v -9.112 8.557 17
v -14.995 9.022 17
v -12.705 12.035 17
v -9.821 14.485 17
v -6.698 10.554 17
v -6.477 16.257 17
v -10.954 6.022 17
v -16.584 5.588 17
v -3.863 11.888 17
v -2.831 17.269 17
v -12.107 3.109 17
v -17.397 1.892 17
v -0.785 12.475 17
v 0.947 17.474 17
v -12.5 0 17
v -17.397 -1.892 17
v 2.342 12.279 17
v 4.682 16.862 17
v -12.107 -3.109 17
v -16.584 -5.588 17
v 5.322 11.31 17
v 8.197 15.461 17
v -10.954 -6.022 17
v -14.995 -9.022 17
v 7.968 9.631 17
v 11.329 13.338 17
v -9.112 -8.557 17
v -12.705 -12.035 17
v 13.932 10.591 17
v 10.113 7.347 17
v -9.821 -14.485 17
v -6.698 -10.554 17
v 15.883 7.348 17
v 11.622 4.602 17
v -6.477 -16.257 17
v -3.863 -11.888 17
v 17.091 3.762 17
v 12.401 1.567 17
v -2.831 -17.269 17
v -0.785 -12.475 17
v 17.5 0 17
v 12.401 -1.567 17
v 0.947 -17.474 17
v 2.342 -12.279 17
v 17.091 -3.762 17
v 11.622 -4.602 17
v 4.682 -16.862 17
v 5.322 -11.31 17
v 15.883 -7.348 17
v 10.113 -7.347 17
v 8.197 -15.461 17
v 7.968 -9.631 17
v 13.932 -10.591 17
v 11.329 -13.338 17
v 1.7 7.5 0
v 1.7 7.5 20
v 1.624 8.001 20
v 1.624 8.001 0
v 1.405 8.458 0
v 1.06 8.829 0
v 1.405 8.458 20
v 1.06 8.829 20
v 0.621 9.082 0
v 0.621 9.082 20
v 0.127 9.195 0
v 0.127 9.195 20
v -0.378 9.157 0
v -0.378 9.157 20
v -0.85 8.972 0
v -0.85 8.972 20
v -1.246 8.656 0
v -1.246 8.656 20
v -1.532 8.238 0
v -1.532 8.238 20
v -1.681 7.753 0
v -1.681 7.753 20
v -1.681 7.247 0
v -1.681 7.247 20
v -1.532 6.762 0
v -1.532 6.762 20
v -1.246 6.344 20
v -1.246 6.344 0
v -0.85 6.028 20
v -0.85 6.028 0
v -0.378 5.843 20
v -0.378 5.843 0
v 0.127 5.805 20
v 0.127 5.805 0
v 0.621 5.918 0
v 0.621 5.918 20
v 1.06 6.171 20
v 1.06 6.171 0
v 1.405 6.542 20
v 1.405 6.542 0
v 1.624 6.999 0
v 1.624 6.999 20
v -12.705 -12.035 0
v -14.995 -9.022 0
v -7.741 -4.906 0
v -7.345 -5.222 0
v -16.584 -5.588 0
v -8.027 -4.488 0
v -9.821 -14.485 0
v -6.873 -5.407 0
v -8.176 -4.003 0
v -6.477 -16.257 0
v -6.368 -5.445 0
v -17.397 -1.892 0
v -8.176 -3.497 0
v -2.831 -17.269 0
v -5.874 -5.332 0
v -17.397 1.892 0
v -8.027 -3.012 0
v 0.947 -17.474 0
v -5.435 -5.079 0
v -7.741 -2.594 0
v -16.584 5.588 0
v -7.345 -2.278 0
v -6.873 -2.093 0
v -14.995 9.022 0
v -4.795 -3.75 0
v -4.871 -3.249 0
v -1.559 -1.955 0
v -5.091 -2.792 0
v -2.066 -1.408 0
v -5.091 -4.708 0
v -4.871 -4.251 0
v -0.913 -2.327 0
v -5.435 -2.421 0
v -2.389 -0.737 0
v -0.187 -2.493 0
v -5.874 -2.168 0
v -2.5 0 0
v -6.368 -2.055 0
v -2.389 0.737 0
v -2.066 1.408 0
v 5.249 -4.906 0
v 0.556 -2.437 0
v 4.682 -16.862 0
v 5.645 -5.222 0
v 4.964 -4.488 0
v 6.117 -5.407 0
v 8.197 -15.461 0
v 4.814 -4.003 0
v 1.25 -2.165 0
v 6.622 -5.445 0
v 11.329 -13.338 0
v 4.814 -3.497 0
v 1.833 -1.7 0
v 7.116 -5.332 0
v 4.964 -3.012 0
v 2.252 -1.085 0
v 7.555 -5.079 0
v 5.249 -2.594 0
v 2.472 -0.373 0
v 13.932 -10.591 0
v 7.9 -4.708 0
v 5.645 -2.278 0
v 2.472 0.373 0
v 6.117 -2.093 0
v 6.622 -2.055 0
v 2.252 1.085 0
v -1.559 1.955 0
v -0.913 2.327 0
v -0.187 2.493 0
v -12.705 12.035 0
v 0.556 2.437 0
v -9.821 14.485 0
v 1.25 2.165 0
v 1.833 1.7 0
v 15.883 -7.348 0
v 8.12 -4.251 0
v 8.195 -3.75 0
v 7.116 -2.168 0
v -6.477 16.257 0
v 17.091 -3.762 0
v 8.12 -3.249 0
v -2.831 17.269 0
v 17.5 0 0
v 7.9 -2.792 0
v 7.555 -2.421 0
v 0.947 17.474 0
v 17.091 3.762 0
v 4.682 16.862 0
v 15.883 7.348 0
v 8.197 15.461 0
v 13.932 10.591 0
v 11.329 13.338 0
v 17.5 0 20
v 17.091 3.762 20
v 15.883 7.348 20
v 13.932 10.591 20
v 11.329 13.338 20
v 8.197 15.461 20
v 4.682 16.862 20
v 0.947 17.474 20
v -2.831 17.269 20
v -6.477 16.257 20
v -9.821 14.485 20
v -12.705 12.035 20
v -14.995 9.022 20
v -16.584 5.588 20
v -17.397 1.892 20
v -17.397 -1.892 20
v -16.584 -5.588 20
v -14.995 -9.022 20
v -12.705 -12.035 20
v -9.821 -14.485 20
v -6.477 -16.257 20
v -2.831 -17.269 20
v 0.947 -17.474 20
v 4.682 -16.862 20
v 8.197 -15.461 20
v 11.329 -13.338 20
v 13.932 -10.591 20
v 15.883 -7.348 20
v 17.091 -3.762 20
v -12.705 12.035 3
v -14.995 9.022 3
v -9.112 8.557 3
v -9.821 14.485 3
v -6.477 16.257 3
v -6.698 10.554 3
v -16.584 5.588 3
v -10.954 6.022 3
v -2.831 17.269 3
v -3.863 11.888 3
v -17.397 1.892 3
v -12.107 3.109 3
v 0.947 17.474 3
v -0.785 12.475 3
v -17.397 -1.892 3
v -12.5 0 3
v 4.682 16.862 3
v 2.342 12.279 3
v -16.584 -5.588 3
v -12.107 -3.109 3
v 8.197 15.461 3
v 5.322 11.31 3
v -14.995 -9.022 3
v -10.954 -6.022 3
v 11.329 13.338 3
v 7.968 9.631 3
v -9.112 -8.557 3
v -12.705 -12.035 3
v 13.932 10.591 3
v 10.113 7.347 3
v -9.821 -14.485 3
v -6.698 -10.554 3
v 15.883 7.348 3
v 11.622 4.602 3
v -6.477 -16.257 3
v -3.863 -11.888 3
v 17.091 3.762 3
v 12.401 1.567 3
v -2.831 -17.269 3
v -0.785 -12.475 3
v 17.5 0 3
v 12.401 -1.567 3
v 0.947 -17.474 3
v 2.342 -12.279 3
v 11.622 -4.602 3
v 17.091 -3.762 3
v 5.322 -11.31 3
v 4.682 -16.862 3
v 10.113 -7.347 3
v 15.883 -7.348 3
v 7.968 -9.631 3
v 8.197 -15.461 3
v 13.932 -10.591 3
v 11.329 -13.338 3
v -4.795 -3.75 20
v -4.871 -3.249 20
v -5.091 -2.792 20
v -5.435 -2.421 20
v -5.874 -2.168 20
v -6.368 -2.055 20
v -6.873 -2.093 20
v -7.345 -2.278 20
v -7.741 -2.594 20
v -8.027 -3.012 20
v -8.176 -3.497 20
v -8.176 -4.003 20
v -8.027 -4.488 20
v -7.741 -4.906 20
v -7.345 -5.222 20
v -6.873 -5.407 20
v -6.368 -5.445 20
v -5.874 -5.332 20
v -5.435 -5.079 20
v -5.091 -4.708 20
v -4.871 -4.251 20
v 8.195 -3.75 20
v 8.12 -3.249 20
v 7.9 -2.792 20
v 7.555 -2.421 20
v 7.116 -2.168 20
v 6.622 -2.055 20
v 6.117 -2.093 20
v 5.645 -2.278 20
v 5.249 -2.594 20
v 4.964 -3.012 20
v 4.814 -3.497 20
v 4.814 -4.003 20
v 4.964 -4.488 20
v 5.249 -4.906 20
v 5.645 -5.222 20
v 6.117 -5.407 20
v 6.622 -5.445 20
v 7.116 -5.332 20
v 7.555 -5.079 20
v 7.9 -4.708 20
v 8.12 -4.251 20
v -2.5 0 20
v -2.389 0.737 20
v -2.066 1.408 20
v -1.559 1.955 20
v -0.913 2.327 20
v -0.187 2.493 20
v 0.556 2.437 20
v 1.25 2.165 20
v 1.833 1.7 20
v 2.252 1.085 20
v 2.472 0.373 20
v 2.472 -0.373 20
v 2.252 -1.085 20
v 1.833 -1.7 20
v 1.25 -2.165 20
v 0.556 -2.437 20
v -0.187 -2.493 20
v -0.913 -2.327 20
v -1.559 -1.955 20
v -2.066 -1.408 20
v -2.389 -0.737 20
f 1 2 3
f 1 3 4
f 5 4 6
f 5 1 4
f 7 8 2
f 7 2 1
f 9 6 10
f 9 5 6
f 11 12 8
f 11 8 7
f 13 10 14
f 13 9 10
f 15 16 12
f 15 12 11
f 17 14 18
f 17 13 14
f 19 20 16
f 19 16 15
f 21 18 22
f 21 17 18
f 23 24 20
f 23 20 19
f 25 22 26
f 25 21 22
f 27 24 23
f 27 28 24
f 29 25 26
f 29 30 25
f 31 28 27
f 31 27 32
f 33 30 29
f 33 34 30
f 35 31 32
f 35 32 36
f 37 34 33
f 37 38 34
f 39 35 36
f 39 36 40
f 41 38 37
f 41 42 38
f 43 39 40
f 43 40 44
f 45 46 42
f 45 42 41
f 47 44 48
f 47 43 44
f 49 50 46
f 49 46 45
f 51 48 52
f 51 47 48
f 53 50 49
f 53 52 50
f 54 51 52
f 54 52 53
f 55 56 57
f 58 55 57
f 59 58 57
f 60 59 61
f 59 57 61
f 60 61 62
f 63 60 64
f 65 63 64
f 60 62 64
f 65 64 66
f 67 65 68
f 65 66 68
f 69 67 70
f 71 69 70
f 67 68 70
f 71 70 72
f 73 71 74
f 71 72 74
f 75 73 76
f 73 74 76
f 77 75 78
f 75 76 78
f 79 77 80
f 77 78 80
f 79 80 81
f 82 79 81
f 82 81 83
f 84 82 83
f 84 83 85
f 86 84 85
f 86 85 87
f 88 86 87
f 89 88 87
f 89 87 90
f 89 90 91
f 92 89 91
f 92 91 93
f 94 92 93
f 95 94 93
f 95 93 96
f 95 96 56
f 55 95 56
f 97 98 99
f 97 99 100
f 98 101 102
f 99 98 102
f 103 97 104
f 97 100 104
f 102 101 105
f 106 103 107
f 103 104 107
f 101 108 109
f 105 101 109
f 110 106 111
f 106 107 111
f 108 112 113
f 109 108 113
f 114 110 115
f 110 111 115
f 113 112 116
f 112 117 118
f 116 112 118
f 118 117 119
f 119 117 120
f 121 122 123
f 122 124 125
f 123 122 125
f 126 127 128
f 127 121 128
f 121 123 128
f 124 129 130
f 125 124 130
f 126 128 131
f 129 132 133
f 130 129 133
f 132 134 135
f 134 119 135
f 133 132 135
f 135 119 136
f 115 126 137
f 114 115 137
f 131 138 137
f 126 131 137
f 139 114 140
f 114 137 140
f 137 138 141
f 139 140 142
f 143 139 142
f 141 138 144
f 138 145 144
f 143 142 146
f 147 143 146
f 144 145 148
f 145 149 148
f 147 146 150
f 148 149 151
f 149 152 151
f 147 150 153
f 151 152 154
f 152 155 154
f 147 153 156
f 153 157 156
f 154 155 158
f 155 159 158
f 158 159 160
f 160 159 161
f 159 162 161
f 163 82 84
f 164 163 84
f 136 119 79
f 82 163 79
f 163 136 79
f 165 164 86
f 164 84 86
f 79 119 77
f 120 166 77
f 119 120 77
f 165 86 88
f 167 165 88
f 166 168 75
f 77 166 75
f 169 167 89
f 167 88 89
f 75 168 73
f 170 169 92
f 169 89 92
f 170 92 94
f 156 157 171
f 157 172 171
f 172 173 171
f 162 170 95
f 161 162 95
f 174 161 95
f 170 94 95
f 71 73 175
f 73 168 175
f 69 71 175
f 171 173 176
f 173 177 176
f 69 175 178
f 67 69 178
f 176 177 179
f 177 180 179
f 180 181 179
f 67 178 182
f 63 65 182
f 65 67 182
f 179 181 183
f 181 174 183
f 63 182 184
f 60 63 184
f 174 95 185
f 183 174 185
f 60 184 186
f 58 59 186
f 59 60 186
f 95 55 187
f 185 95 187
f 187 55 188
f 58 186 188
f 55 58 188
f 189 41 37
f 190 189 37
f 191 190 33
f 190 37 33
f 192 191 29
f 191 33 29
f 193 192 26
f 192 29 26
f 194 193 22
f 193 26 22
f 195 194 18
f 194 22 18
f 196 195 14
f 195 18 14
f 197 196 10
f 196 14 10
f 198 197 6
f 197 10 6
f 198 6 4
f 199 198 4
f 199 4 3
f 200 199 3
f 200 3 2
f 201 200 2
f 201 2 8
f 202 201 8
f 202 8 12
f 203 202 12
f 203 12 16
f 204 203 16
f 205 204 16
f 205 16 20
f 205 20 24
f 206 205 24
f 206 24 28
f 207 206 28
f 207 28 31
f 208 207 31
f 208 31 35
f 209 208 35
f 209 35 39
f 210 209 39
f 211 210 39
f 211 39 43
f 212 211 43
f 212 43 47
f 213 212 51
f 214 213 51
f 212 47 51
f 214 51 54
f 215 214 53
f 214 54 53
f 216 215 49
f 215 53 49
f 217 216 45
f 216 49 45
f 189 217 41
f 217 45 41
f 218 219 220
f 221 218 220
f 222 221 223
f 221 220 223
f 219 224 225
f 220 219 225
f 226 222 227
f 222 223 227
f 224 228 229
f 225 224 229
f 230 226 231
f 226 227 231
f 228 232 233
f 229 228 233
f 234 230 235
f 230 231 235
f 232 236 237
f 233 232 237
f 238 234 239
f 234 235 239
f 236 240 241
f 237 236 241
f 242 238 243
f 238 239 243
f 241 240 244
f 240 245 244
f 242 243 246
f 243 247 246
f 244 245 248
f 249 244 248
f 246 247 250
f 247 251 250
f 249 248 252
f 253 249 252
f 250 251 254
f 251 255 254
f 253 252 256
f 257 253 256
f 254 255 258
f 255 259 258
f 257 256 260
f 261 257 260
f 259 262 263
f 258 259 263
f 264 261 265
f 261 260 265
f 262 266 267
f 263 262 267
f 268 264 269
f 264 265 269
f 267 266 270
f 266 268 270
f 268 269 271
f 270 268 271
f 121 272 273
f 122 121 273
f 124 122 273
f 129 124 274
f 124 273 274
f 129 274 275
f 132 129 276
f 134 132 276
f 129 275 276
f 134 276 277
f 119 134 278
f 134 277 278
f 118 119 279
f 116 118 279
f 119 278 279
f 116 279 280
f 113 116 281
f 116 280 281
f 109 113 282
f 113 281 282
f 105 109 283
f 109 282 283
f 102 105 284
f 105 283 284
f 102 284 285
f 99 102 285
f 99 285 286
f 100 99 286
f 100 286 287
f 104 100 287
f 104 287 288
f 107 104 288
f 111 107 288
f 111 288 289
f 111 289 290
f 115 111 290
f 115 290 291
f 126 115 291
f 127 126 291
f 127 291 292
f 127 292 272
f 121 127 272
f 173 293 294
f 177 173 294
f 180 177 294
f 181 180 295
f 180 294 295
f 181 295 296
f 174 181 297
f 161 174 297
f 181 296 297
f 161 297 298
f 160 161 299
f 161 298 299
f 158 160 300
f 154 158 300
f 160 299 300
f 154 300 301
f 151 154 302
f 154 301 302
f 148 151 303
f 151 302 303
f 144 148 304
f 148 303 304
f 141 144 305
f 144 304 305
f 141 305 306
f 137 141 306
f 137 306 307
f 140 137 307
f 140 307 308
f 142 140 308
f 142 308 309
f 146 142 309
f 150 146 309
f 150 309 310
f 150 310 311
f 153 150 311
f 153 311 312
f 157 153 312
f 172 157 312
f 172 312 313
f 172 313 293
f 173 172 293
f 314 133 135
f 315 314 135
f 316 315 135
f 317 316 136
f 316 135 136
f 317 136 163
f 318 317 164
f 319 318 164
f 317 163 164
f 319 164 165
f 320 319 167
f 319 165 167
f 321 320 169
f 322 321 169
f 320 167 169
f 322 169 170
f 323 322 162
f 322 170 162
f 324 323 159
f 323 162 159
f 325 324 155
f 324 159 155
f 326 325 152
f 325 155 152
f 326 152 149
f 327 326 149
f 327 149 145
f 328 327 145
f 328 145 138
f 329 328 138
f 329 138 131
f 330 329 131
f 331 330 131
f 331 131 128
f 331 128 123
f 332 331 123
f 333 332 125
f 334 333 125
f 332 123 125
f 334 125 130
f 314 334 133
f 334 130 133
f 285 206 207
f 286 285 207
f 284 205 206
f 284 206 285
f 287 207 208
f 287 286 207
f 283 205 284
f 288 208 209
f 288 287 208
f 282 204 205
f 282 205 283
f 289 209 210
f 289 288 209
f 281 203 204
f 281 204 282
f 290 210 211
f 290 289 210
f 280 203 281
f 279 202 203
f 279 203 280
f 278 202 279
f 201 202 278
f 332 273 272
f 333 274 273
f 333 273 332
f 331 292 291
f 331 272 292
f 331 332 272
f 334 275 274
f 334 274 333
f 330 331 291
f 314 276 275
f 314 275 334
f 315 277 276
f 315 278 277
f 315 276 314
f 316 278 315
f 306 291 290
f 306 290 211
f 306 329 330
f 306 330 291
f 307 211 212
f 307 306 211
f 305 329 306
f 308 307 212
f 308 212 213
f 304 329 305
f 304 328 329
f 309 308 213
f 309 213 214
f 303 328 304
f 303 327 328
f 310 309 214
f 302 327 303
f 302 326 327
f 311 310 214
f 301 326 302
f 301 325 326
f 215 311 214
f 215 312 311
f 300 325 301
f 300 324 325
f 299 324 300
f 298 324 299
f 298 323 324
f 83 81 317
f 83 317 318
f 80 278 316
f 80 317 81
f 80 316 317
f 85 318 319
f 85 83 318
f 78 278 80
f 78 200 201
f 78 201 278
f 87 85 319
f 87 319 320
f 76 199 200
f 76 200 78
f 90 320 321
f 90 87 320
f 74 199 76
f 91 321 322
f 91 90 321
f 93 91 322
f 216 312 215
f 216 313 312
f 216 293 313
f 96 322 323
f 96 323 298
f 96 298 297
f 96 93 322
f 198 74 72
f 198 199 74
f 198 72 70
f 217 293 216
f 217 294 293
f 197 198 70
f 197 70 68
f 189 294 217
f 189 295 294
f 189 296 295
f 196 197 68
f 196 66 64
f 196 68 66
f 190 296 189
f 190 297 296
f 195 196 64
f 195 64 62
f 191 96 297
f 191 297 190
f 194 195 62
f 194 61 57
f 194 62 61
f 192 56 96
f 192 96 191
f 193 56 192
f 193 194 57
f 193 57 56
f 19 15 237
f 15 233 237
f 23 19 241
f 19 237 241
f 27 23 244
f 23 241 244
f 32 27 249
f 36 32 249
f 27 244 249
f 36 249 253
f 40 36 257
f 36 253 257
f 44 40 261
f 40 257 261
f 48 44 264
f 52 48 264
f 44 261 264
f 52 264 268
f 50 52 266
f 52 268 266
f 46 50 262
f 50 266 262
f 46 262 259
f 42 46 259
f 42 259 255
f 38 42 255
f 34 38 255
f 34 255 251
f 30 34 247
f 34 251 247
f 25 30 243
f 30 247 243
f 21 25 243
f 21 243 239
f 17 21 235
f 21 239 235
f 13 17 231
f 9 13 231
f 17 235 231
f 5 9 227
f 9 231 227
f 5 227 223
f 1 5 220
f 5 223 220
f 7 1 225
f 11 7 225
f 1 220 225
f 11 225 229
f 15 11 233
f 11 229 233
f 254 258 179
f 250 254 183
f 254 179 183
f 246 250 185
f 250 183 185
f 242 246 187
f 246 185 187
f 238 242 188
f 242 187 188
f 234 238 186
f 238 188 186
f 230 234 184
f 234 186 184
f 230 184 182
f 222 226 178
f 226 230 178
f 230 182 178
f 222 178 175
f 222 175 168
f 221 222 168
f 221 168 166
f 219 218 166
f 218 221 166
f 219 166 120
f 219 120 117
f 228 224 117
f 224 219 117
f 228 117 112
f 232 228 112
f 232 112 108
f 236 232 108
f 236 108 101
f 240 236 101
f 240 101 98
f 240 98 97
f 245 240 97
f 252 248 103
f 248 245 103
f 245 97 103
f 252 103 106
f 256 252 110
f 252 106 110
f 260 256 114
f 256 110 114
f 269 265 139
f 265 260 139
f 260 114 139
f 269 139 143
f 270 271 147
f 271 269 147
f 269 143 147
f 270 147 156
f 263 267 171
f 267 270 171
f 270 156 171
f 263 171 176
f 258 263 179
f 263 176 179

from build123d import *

# Parameters (mm, degrees)
ESQUISSE1_R             = 17.5
BOSS_EXTRU_1_DEPTH      = 20
ESQUISSE3_W             = 14
ESQUISSE3_H             = 5
ESQUISSE4_R             = 2.5
ENL_V_MAT_EXTRU_1_DEPTH = 20
D_GAGEMENT_M31_D        = 3.4


with BuildPart() as part:
    # Esquisse1 → Boss.-Extru.1 (new body)
    with BuildSketch(Plane.XY):
        Circle(ESQUISSE1_R)
    extrude(amount=BOSS_EXTRU_1_DEPTH)

    # Esquisse3 → Enlèvement de matière-Révolution2 (revolve, cut)
    with BuildSketch(Plane(origin=(0, 0, 0), x_dir=(0, 0, -1), z_dir=(1, 0, 0)), mode=Mode.PRIVATE) as enl_vement_de_mati_re_r_volution2_sk:
        with Locations((-10, 15)):
            Rectangle(ESQUISSE3_W, ESQUISSE3_H)
    revolve(enl_vement_de_mati_re_r_volution2_sk.sketch.rotate(Axis((0, 0, 0), (0, 0, 1)), 90), axis=Axis((0, 0, 0), (0, 0, 1)), mode=Mode.SUBTRACT)

    # Esquisse4 → Enlèv. mat.-Extru.1 (cut)
    with BuildSketch(Plane(origin=(0, 0, 0), x_dir=(-1, 0, 0), z_dir=(0, 0, -1))):
        Circle(ESQUISSE4_R)
    extrude(amount=-ENL_V_MAT_EXTRU_1_DEPTH, mode=Mode.SUBTRACT)

    # Dégagement M31 (through all)
    with Locations(Plane(origin=(0, 0, 0), x_dir=(-1, 0, 0), z_dir=(0, 0, -1))):
        with Locations((0, 7.5), (6.495190528, -3.75), (-6.495190528, -3.75), (0, 0)):
            Hole(D_GAGEMENT_M31_D / 2)


solid = part.part
